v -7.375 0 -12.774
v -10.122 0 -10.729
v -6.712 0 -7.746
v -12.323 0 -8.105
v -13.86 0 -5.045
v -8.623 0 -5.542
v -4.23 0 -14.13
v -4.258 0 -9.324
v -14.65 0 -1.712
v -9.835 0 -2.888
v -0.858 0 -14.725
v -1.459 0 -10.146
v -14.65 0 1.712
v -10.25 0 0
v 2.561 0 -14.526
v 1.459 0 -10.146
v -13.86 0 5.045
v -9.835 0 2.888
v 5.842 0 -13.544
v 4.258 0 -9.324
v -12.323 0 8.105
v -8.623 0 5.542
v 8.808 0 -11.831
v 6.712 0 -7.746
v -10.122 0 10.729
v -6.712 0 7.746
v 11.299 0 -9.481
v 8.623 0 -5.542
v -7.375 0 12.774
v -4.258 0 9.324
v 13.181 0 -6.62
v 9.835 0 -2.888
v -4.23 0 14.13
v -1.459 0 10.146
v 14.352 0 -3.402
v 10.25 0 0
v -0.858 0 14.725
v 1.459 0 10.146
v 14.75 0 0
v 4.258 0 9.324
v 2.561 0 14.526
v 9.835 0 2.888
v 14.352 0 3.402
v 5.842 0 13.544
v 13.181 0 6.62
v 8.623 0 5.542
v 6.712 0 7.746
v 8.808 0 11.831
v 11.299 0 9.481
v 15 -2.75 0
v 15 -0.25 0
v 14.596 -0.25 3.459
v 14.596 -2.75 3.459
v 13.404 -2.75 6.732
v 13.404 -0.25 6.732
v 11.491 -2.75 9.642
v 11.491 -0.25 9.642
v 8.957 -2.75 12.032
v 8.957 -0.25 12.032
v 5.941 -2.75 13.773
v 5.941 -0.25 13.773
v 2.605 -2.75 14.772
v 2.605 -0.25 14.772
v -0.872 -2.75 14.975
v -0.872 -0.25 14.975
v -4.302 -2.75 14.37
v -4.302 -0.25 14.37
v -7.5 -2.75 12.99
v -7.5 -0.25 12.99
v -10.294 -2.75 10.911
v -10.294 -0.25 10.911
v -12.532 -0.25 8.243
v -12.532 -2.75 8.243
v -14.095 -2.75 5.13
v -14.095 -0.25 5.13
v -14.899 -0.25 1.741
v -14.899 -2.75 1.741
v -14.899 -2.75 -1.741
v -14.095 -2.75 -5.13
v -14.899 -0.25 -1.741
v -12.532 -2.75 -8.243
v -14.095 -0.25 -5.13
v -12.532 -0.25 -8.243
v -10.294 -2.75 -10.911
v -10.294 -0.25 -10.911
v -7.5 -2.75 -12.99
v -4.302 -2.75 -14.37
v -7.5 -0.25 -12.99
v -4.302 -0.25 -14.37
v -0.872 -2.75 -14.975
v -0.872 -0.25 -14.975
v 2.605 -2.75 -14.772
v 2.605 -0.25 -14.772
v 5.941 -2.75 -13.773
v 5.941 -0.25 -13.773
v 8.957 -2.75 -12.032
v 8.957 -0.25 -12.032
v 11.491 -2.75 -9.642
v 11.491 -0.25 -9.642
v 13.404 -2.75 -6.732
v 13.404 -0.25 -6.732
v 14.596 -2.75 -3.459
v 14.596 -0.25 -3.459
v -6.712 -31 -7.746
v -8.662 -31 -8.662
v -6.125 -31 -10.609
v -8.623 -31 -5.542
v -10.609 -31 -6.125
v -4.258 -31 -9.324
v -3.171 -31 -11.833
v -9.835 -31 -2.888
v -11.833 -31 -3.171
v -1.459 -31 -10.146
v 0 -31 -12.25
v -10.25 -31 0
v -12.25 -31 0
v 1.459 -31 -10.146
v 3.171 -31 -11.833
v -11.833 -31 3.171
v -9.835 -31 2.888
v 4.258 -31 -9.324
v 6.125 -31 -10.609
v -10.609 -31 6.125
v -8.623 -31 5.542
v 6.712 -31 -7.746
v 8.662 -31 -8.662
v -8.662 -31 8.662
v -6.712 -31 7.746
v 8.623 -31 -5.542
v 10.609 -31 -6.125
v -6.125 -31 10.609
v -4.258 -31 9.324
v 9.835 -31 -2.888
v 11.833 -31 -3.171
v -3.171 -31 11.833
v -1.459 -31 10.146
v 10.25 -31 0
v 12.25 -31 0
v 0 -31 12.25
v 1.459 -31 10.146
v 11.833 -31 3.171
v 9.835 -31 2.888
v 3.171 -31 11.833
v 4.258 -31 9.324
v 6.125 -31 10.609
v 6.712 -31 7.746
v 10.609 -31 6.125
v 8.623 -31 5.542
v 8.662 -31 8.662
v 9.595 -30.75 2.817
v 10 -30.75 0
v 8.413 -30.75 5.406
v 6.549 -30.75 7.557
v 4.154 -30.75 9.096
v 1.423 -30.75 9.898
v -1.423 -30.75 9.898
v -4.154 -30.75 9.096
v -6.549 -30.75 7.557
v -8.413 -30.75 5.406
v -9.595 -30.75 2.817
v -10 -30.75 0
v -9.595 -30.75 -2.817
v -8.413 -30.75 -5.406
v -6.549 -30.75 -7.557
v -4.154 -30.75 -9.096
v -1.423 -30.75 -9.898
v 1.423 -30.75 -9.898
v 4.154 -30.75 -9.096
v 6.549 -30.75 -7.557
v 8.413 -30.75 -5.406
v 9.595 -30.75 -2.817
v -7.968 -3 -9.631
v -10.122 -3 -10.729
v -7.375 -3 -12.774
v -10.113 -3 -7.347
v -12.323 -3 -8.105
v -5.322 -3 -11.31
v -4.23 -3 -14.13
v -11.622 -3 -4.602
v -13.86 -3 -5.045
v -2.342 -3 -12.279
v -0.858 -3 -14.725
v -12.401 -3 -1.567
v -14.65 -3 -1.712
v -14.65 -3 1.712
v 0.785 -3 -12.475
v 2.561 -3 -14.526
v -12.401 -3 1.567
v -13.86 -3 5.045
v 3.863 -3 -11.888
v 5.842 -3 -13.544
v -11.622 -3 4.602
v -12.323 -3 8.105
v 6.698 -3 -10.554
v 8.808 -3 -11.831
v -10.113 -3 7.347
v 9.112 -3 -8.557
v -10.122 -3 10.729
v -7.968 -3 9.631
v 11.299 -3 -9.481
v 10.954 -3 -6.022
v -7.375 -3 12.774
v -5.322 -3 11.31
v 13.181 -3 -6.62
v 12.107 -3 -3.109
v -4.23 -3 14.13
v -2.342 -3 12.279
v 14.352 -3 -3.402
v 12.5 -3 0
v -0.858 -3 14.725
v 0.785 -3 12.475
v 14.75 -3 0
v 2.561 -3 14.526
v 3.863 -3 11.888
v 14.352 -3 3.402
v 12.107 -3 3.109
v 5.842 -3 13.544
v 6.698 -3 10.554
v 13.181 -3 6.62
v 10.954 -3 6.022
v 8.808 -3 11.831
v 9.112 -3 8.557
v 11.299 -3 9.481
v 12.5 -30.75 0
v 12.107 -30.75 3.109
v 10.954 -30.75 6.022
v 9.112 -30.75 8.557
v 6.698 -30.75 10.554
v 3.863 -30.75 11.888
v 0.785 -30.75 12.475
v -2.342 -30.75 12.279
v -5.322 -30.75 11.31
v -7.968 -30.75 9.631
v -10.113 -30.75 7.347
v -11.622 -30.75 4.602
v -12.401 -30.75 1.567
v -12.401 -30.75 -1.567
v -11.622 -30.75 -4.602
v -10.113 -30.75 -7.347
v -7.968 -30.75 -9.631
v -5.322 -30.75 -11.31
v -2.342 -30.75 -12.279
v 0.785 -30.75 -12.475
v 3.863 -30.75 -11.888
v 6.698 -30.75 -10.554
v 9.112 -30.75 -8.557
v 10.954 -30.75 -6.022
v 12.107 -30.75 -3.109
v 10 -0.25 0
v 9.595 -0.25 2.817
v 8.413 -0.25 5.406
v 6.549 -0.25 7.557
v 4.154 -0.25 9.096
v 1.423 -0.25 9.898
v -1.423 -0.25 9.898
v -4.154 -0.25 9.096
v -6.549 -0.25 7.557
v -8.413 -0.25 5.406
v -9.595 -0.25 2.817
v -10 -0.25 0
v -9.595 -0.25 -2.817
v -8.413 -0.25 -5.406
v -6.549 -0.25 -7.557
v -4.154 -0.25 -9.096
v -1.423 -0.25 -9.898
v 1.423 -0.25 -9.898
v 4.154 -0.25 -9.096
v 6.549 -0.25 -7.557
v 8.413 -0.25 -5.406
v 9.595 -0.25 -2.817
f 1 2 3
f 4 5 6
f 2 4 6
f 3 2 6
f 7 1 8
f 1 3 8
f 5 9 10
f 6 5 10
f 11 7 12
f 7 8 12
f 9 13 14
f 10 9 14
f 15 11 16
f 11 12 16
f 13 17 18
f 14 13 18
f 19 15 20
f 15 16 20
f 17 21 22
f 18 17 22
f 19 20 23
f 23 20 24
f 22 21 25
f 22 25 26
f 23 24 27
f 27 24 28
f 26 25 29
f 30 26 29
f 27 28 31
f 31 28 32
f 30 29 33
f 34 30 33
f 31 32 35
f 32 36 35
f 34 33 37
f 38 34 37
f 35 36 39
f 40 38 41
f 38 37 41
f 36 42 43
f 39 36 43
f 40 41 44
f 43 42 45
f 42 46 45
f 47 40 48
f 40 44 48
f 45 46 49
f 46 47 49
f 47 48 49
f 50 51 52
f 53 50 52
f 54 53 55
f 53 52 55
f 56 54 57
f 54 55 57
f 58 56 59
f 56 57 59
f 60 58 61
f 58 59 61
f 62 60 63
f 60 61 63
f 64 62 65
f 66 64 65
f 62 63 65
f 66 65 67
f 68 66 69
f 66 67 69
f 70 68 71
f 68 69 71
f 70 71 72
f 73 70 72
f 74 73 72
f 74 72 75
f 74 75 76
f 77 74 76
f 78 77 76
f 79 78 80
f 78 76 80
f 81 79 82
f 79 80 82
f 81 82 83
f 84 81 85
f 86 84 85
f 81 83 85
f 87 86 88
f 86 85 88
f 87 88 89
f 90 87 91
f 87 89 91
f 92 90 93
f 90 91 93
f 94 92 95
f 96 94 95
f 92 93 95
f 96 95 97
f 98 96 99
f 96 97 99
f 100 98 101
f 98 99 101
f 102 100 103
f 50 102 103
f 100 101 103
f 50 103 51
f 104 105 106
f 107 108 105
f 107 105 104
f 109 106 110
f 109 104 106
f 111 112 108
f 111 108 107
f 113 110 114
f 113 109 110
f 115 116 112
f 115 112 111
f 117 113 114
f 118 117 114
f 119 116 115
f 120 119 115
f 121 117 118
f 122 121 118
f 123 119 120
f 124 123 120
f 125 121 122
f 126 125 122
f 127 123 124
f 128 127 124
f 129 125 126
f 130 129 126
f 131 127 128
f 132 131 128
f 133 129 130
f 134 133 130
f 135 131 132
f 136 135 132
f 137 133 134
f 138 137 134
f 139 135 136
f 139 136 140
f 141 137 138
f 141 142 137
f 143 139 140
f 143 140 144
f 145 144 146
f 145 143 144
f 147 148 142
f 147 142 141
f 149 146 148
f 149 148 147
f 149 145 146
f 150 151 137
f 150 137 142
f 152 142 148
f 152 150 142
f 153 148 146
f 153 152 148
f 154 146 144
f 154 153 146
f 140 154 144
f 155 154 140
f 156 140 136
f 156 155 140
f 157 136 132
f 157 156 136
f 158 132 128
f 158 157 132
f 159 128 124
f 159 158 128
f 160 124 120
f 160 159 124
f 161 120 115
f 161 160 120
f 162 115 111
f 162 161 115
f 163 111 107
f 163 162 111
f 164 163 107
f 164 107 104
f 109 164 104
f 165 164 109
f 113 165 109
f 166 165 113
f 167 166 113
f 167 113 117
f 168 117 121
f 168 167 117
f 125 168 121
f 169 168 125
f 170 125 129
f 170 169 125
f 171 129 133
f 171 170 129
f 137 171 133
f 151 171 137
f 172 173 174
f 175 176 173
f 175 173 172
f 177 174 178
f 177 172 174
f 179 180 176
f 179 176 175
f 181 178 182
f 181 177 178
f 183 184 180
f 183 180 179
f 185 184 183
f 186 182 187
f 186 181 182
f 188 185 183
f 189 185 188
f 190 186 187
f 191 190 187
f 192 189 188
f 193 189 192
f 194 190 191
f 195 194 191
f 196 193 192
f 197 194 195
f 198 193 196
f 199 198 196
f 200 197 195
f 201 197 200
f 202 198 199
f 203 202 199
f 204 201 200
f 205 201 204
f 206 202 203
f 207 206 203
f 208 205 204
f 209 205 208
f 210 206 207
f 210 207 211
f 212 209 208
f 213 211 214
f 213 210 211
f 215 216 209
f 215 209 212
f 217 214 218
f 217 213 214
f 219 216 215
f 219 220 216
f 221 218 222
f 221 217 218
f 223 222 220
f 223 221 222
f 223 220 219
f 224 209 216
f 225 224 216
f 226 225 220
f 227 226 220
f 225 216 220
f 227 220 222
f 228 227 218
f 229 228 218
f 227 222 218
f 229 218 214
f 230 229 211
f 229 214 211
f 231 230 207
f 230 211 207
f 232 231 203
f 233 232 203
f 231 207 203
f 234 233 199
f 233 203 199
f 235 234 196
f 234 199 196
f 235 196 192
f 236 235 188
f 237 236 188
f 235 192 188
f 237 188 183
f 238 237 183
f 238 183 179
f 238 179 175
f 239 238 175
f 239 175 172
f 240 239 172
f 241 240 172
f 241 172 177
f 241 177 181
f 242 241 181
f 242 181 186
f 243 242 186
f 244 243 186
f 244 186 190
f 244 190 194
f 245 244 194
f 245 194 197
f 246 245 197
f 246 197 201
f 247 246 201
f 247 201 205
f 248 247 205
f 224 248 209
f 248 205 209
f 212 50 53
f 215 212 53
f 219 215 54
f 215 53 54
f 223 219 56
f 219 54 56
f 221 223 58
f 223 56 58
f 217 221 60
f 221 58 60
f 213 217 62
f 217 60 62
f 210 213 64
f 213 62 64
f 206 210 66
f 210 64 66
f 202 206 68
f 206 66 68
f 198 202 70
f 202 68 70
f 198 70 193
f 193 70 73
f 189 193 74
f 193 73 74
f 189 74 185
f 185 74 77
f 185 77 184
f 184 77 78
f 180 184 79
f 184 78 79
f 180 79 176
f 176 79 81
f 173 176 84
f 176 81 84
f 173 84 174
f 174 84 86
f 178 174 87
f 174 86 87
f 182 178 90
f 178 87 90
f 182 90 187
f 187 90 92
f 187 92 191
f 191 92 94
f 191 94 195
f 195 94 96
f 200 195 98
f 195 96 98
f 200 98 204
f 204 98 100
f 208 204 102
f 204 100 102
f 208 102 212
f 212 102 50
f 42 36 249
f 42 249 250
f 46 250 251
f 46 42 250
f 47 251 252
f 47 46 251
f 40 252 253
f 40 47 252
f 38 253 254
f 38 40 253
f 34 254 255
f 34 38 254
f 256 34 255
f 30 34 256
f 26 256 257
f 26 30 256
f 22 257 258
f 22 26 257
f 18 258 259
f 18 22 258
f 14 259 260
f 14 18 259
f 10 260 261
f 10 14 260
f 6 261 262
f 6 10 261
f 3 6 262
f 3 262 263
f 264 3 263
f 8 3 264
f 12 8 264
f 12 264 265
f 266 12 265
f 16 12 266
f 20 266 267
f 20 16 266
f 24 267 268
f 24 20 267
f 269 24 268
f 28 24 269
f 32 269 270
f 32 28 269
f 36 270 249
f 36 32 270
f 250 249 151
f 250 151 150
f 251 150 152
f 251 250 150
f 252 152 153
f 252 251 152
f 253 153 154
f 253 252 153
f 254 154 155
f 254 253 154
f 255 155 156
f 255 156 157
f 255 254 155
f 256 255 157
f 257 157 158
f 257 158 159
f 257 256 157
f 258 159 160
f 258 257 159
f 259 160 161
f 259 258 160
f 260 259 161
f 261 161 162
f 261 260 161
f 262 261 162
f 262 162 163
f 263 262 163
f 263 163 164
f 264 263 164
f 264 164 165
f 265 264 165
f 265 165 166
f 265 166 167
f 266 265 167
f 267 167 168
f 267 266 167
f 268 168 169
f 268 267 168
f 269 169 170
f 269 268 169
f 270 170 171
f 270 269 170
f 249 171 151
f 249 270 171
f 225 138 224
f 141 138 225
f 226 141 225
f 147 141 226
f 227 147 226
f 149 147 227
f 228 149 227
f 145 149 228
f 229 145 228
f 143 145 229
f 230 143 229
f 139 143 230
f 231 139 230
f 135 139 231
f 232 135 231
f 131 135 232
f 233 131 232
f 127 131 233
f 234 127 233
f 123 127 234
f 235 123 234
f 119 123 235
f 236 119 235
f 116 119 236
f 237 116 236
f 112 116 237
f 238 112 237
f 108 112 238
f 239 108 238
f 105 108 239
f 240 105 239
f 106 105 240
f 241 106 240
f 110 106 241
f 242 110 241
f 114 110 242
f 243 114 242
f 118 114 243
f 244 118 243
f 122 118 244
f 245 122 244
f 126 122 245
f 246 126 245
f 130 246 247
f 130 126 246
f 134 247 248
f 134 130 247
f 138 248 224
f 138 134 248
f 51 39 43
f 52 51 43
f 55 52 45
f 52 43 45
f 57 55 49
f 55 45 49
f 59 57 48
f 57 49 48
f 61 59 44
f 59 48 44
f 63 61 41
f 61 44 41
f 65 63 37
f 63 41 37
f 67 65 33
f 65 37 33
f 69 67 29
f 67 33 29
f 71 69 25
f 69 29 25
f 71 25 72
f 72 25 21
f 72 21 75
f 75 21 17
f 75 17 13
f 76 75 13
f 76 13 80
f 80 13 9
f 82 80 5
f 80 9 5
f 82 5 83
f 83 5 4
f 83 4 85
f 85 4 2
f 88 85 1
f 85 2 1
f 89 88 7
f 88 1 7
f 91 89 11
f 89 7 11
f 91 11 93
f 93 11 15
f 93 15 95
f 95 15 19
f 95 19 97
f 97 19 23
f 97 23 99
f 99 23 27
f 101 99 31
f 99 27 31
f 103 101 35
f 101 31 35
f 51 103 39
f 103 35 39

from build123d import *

# Parameters (mm, degrees)
F0_R     = 15
F0_R_2   = 12.5
F1_DEPTH = 3
F0_R_3   = 10
F2_DEPTH = 31
F3_SIZE  = 0.25


with BuildPart() as f1:
    # F0 (on Front) → F1 (new body)
    with BuildSketch(Plane.XZ):
        Circle(F0_R)
        Circle(F0_R_2, mode=Mode.SUBTRACT)
    extrude(amount=F1_DEPTH)

    # F0 (on Front) → F2 (join)
    with BuildSketch(Plane.XZ):
        Circle(F0_R_2)
        Circle(F0_R_3, mode=Mode.SUBTRACT)
    extrude(amount=F2_DEPTH)

    # F3
    f3_edges = [f1.edges().sort_by_distance(p)[0] for p in [
        (-12.5, -31, 0),
        (-10, -31, 0),
        (-15, 0, 0),
        (-10, 0, 0),
        (-15, -3, 0),
    ]]
    chamfer(f3_edges, length=F3_SIZE)


solid = f1.part
